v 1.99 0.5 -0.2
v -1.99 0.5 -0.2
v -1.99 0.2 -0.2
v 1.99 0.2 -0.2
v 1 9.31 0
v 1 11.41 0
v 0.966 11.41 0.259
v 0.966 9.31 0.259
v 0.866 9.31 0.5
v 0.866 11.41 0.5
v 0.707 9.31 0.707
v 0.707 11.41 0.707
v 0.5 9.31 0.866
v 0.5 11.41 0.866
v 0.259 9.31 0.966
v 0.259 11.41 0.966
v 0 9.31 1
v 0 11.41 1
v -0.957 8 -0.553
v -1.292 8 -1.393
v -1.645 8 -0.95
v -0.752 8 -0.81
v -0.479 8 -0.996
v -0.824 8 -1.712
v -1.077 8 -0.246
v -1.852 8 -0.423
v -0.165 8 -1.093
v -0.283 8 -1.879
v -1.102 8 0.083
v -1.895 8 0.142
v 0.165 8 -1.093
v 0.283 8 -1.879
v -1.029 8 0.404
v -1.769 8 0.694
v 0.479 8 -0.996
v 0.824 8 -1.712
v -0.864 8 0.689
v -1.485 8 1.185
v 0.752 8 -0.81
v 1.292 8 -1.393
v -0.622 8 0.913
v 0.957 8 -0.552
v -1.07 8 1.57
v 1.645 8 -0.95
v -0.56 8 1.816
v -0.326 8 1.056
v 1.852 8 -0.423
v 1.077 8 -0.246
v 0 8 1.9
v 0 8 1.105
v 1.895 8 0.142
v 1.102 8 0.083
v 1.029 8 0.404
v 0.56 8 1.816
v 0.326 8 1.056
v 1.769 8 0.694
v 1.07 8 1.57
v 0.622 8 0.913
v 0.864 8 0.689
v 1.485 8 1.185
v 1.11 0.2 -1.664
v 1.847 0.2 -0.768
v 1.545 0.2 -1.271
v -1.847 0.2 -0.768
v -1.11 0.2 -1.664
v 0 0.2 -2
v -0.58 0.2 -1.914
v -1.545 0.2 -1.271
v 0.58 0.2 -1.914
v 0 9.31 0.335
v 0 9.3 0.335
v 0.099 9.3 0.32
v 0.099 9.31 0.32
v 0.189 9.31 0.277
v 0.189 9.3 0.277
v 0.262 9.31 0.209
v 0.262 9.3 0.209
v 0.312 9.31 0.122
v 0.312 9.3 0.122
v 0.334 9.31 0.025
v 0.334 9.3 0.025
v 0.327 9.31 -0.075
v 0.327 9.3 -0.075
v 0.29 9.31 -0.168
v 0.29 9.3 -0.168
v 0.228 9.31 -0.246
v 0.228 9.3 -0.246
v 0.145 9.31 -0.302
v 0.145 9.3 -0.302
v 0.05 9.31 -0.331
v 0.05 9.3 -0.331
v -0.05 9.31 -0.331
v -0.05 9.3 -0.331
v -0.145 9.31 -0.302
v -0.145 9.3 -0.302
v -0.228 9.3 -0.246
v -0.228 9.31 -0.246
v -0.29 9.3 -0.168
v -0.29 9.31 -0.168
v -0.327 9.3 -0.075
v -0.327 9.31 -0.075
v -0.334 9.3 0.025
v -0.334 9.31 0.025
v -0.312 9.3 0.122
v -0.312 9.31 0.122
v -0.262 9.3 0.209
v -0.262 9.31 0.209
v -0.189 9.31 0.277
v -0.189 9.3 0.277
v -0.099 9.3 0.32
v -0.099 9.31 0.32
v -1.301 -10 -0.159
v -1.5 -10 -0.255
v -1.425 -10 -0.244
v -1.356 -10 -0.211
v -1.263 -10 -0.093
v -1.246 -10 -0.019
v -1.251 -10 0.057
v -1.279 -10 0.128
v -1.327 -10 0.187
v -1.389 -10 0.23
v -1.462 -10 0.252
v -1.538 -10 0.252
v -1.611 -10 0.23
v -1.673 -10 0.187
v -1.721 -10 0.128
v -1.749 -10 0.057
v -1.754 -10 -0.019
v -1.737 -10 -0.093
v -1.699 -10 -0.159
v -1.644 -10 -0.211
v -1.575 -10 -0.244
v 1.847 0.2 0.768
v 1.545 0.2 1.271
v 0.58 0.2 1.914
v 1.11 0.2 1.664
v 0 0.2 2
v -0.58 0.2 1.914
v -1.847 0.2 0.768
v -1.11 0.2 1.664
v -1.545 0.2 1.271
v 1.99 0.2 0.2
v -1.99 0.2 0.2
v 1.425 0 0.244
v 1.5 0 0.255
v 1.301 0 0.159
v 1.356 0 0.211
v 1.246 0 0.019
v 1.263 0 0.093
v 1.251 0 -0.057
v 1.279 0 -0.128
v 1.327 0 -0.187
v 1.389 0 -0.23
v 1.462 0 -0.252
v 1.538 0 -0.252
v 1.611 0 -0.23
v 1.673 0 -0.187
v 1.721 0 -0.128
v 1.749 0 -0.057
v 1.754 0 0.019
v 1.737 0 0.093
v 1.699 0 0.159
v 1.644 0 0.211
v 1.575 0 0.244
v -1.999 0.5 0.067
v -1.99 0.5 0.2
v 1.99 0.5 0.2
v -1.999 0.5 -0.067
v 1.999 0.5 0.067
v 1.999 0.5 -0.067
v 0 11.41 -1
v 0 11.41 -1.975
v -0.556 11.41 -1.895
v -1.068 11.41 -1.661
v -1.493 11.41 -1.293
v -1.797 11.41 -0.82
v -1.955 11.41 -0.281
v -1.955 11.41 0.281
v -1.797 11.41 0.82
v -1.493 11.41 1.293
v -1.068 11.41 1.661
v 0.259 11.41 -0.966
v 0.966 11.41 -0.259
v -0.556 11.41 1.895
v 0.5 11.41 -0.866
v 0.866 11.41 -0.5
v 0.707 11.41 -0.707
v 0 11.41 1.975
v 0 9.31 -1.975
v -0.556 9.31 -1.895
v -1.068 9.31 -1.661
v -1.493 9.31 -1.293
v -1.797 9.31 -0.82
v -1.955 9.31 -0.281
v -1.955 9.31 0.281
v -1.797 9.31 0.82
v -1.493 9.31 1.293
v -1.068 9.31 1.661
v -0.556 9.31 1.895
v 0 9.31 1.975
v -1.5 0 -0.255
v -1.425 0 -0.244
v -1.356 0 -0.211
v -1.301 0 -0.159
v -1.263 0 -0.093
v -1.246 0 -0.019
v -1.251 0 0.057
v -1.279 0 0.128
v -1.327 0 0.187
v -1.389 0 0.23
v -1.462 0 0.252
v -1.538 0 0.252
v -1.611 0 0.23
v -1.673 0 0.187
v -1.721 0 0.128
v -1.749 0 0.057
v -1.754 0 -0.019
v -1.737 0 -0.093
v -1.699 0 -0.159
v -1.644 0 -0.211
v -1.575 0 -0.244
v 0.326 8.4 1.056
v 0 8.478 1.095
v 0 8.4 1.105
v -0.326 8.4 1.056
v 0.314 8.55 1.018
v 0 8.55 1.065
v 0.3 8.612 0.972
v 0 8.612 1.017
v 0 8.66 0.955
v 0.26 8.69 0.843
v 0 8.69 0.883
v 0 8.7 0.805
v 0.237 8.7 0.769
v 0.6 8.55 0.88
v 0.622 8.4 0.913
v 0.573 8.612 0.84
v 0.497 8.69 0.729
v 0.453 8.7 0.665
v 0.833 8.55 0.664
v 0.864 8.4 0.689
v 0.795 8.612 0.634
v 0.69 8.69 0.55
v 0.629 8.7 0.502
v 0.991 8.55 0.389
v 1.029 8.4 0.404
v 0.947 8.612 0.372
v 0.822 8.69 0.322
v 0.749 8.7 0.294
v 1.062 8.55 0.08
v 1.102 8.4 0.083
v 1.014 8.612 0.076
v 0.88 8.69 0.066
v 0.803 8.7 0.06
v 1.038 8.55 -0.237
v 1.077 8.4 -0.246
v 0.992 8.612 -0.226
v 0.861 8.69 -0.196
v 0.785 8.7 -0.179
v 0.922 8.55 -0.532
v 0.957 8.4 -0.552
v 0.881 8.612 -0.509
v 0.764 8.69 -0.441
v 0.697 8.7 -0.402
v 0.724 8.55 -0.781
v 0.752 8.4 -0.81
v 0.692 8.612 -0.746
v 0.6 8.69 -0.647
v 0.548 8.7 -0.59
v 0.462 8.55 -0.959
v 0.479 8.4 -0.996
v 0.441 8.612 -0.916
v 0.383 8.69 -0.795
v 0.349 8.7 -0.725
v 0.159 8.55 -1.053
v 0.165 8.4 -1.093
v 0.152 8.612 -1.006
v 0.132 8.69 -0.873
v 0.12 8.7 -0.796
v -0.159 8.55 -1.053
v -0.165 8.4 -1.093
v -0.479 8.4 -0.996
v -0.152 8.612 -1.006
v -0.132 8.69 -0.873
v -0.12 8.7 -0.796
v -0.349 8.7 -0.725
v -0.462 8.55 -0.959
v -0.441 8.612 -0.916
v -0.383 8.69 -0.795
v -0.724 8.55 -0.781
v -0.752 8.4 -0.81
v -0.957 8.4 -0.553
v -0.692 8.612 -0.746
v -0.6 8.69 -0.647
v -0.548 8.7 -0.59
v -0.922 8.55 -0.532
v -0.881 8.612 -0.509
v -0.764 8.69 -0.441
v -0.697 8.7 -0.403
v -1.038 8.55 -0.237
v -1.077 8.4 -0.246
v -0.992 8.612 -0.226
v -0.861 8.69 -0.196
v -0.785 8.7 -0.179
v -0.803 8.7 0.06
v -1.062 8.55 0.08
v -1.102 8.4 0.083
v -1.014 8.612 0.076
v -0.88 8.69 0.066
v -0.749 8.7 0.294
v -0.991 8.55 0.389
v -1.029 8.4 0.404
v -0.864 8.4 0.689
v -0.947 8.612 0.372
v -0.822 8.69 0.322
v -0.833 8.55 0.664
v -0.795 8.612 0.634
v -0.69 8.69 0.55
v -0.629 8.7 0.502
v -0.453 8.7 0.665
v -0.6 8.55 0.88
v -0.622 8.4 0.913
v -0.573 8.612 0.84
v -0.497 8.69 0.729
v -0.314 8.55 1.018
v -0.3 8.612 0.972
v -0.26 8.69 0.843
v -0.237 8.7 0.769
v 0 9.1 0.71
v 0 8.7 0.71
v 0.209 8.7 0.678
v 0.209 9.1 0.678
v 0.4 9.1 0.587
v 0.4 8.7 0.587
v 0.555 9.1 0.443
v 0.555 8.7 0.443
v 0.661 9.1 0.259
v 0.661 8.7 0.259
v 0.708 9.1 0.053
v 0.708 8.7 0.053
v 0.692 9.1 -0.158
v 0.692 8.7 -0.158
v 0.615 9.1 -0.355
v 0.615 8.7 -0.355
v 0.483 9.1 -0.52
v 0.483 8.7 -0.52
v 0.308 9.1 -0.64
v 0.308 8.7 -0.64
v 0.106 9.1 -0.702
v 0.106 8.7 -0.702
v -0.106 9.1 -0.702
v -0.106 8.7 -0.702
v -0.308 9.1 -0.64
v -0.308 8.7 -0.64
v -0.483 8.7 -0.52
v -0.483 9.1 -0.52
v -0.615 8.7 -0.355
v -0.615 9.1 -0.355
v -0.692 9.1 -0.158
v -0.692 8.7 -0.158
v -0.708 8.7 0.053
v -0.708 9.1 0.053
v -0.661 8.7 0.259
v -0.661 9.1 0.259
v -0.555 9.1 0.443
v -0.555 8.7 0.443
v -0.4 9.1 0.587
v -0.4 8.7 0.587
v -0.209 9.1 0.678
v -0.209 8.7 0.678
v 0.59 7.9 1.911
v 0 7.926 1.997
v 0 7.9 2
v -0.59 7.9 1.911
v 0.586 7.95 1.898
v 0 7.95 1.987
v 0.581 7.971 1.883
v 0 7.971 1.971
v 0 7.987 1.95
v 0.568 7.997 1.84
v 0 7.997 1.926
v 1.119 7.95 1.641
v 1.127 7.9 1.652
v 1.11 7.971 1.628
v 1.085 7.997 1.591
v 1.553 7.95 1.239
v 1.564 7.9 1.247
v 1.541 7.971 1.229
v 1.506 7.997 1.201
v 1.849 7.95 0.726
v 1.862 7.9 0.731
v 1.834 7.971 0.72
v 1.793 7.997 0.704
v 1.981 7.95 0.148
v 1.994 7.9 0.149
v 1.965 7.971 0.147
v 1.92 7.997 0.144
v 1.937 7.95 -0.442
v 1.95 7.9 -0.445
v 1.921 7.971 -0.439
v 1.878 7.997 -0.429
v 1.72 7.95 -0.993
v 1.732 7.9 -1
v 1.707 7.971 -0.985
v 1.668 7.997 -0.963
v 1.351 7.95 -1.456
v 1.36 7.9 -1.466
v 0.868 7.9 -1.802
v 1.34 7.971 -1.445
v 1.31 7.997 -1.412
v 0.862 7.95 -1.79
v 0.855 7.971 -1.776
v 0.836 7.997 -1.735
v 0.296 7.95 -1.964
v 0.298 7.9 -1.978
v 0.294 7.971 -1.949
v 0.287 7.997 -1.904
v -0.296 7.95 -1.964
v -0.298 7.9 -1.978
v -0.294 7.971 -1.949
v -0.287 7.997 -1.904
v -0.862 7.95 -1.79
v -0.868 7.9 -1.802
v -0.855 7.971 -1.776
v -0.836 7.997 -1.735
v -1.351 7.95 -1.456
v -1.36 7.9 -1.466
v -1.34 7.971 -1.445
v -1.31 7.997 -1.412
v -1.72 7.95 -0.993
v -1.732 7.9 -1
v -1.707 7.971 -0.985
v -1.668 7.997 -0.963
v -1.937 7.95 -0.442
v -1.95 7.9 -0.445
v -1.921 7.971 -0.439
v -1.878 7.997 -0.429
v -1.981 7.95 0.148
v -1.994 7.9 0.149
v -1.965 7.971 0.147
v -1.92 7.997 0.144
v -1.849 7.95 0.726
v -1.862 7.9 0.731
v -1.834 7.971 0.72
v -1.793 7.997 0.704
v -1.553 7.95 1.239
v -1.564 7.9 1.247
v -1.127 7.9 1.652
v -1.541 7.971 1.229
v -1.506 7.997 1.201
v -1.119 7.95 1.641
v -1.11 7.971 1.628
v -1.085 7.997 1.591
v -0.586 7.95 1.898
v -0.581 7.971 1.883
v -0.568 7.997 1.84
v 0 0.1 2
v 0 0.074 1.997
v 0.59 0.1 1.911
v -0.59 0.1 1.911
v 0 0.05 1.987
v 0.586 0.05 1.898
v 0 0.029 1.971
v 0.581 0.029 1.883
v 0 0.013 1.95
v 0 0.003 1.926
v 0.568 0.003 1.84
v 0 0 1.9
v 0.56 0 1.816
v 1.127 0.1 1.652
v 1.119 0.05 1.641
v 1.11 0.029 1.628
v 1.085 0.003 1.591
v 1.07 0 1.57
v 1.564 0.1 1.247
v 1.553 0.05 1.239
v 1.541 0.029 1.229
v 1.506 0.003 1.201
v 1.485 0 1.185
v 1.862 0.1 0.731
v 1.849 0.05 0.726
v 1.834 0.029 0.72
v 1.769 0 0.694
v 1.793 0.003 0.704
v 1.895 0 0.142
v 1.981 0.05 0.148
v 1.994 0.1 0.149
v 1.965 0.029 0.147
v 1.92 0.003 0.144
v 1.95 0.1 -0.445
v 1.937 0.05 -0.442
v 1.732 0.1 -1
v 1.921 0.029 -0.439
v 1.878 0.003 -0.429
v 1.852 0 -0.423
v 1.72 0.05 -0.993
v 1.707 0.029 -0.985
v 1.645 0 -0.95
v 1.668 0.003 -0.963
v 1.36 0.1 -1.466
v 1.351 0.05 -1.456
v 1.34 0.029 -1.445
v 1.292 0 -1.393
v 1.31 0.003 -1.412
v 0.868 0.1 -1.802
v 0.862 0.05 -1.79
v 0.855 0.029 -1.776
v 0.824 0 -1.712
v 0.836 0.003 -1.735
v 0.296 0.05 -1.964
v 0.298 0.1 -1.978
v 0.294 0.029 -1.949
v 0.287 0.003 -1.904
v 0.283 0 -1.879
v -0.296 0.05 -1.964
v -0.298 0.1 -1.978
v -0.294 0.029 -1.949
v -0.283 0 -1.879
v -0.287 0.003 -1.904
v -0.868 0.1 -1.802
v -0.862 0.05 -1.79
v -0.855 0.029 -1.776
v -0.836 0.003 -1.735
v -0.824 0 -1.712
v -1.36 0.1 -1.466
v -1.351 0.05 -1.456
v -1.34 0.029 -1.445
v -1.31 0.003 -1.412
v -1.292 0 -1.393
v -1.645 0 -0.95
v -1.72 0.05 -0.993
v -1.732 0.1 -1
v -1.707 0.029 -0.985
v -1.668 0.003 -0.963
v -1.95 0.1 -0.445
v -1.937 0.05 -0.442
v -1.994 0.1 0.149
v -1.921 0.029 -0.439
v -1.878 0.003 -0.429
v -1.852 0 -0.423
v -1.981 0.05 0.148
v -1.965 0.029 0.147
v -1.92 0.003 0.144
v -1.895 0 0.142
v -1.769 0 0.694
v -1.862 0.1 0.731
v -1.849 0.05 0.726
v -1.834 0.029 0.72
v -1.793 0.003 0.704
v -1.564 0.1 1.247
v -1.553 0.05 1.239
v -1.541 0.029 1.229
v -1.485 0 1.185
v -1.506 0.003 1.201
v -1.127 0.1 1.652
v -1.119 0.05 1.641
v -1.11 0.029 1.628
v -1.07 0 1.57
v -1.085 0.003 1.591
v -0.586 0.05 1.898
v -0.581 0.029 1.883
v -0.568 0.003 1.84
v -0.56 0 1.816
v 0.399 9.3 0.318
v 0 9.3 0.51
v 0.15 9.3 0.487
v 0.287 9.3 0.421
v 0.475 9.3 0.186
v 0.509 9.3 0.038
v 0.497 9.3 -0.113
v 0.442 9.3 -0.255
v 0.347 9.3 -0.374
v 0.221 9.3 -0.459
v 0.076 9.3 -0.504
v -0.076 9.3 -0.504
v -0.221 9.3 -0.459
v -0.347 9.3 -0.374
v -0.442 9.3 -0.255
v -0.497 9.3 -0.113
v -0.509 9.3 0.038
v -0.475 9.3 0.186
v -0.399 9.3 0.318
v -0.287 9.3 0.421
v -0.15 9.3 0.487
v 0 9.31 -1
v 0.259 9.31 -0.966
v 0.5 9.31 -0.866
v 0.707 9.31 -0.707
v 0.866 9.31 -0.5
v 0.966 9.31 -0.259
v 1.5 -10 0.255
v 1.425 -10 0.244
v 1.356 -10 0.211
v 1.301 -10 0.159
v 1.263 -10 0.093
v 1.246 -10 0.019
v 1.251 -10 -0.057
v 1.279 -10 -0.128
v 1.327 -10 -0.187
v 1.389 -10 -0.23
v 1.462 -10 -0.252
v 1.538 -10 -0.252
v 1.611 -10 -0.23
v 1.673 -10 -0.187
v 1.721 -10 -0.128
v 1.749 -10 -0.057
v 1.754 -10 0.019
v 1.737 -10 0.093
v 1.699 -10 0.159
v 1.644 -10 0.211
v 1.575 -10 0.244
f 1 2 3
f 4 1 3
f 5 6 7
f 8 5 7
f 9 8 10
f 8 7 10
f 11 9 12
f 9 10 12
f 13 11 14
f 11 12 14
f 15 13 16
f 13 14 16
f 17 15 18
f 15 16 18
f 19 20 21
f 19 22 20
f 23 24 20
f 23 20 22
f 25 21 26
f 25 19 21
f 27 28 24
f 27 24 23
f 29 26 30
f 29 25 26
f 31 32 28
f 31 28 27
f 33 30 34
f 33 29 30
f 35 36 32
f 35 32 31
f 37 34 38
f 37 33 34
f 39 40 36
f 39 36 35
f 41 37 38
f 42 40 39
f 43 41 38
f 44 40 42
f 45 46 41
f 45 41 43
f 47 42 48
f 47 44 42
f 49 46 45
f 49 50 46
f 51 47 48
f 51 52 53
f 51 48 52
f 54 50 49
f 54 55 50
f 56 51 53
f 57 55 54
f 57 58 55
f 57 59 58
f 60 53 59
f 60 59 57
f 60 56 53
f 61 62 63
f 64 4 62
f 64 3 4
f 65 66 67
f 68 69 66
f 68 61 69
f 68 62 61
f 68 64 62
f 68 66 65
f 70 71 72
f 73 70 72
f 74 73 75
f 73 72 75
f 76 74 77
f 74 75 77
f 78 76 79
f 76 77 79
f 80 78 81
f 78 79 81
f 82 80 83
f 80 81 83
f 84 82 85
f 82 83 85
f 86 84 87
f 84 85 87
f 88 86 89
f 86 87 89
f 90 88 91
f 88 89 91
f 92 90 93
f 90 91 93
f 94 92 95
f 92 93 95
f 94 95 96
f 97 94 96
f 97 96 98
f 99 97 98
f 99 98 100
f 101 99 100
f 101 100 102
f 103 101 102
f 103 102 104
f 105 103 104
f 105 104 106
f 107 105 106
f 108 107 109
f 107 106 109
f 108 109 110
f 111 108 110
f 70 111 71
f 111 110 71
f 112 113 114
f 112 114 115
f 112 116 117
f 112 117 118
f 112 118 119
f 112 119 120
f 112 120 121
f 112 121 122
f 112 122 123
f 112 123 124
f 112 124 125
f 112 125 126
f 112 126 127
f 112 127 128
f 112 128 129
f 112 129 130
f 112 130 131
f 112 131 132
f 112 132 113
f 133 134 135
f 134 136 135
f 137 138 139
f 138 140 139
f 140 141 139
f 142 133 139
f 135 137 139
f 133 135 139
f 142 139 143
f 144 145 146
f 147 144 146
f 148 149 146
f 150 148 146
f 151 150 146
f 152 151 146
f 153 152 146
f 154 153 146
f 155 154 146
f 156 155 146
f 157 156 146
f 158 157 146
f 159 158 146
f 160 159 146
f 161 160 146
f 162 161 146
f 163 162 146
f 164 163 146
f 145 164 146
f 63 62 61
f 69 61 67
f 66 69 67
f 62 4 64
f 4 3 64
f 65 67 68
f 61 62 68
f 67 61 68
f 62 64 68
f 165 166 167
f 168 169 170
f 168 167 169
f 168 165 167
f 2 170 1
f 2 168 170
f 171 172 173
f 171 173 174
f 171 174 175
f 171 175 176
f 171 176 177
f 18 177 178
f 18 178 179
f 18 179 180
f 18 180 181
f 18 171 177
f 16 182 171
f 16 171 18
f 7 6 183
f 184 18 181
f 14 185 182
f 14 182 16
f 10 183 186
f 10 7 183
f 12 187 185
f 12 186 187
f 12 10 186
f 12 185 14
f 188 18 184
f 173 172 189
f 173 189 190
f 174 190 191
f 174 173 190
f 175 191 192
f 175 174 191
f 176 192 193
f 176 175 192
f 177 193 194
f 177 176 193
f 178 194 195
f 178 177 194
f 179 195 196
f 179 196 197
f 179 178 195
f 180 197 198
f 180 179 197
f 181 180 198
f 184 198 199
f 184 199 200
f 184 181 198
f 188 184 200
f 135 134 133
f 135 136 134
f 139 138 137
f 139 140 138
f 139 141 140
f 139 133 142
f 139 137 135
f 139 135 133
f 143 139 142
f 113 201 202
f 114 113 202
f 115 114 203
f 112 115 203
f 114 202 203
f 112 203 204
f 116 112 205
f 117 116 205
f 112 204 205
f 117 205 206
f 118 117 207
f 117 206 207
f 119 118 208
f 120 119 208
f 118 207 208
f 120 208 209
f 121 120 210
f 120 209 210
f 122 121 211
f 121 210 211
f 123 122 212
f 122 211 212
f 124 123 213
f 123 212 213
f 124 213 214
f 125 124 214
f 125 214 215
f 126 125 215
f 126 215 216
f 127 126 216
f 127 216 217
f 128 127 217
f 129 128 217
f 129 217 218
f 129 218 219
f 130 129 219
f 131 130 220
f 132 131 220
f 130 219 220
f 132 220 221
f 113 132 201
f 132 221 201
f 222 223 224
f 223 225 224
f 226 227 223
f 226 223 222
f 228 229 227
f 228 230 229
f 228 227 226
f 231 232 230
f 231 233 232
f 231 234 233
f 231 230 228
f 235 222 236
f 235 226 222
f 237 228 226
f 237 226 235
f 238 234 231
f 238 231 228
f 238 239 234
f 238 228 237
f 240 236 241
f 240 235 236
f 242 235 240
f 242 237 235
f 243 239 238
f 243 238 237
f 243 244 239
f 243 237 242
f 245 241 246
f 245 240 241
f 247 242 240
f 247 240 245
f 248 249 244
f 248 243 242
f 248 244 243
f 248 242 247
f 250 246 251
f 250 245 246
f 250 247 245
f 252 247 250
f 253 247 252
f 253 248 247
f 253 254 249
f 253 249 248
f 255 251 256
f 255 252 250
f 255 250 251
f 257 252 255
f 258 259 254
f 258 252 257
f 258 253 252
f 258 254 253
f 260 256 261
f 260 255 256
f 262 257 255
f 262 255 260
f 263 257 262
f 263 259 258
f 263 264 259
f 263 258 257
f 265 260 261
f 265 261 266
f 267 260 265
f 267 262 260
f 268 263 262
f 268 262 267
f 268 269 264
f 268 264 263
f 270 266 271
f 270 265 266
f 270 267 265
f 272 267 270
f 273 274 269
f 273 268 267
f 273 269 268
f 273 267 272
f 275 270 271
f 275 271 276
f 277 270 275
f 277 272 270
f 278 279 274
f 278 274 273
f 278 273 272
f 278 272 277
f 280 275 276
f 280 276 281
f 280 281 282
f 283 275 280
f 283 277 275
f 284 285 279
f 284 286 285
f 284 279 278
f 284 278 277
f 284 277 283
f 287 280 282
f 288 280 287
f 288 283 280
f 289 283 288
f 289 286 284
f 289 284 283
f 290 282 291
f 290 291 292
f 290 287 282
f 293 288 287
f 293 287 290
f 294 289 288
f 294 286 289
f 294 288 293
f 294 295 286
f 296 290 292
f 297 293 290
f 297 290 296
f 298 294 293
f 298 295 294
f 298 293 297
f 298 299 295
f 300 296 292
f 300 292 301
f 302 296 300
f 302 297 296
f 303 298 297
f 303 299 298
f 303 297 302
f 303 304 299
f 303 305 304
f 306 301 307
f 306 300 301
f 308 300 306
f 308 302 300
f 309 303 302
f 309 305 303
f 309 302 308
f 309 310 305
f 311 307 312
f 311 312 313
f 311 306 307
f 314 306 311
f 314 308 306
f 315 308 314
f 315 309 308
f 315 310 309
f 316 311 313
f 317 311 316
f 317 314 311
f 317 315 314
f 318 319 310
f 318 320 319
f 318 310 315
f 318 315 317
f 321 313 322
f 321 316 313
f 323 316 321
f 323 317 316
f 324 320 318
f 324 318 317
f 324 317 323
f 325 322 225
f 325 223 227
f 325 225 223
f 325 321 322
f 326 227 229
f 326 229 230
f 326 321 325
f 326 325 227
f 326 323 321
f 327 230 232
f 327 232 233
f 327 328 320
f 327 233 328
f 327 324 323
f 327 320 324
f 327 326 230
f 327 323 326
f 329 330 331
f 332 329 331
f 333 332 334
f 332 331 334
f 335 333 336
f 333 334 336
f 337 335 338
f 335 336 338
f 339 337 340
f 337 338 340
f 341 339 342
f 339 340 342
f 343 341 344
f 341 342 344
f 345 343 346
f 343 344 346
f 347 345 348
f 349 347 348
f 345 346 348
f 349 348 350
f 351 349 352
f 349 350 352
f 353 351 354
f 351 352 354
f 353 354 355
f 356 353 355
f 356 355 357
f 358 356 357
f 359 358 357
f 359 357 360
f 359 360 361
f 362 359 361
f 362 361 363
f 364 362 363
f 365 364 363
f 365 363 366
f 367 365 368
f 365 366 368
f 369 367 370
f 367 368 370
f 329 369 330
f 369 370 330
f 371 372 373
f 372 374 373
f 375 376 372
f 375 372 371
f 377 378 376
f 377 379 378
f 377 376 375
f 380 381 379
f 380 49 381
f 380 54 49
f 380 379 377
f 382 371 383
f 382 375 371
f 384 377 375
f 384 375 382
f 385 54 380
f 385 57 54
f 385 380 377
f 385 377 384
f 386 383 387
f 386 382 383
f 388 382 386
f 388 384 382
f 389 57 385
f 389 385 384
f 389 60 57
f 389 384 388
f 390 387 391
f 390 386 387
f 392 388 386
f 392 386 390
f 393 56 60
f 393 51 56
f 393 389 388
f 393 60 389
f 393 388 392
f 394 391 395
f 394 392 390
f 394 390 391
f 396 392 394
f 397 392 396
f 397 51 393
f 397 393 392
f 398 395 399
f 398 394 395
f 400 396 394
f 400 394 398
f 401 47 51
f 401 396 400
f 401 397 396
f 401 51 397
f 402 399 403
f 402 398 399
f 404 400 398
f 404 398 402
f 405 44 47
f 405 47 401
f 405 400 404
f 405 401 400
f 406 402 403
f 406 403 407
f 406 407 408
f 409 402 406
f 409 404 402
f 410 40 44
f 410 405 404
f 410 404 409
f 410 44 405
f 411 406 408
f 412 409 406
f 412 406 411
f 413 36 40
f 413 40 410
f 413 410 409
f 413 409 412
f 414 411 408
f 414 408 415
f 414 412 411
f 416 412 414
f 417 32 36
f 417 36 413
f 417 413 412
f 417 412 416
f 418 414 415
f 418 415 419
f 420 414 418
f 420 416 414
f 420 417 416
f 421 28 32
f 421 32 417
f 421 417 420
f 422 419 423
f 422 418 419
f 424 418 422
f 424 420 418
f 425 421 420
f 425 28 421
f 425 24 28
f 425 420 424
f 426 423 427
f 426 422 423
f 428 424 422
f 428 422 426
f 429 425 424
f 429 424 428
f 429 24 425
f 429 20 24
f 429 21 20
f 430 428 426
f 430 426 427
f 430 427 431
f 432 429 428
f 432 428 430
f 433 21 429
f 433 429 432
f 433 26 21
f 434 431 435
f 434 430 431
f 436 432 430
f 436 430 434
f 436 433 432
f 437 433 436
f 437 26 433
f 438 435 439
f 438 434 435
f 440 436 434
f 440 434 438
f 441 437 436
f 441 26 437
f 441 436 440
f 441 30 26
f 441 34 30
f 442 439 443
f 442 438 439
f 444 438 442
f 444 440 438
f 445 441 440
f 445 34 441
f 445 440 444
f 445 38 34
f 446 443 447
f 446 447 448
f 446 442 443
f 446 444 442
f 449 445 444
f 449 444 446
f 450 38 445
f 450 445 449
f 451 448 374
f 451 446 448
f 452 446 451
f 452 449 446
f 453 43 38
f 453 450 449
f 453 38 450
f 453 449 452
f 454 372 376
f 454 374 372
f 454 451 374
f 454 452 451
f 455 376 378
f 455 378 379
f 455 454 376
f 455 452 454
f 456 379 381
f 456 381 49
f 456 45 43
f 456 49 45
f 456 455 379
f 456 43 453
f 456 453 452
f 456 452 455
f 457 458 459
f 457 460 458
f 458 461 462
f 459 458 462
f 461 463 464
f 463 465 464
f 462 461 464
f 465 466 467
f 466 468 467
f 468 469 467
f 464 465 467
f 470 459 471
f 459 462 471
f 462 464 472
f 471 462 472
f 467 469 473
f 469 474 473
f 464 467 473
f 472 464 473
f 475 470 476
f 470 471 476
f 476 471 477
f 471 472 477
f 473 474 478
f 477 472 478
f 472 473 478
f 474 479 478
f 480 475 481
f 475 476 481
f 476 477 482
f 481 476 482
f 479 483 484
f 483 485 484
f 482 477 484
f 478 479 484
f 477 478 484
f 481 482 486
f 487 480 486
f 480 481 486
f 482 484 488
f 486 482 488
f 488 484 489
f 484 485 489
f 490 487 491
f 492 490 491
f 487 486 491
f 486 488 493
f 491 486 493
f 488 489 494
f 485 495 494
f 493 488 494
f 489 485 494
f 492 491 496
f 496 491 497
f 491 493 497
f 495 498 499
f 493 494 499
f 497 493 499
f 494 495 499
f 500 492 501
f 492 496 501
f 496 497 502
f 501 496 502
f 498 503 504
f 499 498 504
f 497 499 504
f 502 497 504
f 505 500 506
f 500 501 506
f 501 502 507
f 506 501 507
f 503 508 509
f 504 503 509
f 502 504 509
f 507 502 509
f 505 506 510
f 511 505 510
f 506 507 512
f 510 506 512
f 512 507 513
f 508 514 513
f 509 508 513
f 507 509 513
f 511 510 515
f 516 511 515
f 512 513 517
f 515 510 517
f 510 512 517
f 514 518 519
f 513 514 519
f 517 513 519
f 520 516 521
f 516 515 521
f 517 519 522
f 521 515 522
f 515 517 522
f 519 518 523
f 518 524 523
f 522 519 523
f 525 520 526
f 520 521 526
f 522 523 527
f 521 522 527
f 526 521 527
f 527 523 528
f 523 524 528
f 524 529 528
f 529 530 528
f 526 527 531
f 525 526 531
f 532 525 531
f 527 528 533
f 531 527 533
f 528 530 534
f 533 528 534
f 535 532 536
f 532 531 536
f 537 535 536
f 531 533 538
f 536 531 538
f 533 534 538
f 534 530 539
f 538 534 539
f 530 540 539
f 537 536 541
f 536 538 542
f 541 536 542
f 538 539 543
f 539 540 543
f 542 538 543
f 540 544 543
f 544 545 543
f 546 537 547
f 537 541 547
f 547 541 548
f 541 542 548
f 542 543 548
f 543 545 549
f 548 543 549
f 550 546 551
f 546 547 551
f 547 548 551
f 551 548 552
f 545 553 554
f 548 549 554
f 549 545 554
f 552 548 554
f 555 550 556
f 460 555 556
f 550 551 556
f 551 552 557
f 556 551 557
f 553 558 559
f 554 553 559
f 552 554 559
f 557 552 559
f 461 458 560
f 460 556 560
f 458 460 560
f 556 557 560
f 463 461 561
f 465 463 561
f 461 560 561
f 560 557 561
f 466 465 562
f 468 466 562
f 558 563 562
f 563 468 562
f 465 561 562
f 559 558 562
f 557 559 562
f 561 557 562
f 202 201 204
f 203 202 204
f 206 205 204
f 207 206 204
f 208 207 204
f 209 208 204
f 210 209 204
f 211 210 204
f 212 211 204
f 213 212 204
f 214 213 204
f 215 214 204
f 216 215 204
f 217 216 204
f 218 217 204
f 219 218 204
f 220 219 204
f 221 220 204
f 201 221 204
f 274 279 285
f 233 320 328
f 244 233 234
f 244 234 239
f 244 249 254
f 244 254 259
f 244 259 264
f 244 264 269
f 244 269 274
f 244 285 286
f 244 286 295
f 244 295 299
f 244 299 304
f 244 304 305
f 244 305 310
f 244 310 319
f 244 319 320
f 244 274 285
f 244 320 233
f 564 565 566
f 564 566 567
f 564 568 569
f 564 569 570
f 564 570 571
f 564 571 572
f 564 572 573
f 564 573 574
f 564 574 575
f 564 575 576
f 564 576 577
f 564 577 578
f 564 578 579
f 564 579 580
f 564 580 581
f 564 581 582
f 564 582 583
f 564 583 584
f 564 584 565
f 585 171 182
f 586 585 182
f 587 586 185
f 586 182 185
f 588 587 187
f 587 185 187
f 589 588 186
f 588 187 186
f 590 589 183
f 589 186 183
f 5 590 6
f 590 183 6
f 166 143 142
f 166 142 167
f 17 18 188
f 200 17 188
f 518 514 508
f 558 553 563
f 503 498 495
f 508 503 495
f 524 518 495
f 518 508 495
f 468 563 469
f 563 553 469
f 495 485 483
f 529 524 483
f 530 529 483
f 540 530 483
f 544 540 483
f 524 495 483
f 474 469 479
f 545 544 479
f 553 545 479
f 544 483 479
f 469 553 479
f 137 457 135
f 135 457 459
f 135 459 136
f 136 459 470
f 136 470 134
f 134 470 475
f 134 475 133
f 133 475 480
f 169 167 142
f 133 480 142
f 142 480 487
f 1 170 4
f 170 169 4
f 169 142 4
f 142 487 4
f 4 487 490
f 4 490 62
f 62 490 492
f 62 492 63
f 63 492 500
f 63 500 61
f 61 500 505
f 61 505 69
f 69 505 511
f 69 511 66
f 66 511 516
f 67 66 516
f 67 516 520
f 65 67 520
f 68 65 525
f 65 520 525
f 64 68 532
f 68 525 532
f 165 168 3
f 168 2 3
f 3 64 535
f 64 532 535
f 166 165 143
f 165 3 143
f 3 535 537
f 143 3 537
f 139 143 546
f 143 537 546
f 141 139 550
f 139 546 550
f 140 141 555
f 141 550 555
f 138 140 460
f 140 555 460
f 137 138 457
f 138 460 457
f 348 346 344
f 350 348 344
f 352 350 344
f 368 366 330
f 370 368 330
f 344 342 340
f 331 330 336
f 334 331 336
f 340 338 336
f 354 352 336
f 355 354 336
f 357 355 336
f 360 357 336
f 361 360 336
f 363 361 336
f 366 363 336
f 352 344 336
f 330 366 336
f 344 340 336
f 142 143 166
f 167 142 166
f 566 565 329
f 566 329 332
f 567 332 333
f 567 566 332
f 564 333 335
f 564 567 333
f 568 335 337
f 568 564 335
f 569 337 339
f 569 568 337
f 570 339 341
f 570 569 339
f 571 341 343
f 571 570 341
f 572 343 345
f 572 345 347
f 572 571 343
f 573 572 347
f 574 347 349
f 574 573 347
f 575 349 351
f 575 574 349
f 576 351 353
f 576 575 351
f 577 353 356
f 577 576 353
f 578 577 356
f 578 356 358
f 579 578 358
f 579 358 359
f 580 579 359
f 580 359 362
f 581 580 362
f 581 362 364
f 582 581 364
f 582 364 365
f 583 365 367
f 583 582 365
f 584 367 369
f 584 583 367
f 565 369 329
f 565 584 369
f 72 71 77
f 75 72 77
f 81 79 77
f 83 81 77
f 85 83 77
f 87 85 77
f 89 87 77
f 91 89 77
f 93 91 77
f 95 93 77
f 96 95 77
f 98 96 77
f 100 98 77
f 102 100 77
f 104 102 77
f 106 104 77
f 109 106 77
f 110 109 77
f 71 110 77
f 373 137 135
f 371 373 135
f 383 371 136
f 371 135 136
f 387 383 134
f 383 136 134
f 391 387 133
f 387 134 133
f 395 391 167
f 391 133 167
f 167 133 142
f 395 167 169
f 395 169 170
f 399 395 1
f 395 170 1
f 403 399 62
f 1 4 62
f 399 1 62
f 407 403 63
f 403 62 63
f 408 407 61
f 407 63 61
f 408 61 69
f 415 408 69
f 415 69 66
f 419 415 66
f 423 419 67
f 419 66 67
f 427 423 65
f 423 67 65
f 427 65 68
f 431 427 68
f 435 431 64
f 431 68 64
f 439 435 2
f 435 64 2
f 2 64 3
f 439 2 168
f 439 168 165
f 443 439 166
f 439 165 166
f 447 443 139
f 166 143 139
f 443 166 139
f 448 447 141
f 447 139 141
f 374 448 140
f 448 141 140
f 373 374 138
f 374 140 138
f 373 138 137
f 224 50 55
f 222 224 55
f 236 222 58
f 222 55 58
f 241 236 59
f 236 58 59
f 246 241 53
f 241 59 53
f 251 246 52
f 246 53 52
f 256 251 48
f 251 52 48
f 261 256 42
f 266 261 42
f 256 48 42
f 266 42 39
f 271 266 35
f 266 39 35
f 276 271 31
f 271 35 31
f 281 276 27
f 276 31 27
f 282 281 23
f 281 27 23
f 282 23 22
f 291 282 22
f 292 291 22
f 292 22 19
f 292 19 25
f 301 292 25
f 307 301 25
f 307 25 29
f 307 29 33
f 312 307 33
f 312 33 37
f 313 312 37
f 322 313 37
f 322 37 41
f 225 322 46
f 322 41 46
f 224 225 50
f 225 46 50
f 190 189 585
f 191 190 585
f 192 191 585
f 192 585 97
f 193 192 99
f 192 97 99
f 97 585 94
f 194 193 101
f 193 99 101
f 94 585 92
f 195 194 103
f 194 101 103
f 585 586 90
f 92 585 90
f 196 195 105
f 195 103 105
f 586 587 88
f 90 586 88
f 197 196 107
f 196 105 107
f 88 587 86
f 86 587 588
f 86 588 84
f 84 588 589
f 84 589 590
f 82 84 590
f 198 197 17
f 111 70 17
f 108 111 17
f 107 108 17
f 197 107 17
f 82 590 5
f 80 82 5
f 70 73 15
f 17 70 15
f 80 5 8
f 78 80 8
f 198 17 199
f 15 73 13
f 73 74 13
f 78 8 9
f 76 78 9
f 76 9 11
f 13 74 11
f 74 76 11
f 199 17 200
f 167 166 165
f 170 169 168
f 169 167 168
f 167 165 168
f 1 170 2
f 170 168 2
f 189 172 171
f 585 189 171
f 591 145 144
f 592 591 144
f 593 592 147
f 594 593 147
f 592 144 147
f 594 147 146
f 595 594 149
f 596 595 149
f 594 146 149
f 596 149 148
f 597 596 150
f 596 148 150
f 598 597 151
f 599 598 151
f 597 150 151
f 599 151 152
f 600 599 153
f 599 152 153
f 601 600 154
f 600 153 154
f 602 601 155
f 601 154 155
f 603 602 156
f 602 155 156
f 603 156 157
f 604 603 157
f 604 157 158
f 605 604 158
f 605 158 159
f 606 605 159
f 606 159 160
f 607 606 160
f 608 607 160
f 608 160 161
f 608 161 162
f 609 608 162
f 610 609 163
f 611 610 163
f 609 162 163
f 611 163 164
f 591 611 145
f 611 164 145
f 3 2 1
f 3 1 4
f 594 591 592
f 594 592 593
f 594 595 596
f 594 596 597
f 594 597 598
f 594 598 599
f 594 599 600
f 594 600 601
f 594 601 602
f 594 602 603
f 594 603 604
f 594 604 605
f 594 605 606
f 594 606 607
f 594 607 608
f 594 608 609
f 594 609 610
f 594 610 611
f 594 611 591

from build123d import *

# Parameters (mm, degrees)
SKETCH1_R              = 2
BOSS_EXTRUDE1_DEPTH    = 8
SKETCH2_R              = 1.105
BOSS_EXTRUDE2_DEPTH    = 0.7
SKETCH3_R              = 0.71
BOSS_EXTRUDE3_DEPTH    = 0.6
SKETCH4_R              = 0.335
BOSS_EXTRUDE4_DEPTH    = 2.11
SPLIT1_SURFACE_1_BACK  = 13.735
SPLIT1_SURFACE_1_DEPTH = 27.47
SPLIT1_SURFACE_2_BACK  = 13.735
SPLIT1_SURFACE_2_DEPTH = 27.47
FILLET1_R              = 0.1
FILLET2_R              = 0.1
FILLET3_R              = 0.3
CHAMFER1_SIZE          = 0.2
FILLET4_R              = 0.1
SKETCH6_R              = 0.255
BOSS_EXTRUDE5_DEPTH    = 10
BOSS_EXTRUDE5_2_DEPTH  = 10
SKETCH7_R              = 1.975
BOSS_EXTRUDE6_DEPTH    = 2.1
CUT_EXTRUDE1_DEPTH     = 2.1


with BuildPart() as part:
    # Sketch1 → Boss-Extrude1 (new body)
    with BuildSketch(Plane(origin=(0, 0, 0), x_dir=(1, 0, 0), z_dir=(0, 1, 0))):
        with Locations(Location((0, 0, 0), (0, 0, 270))):
            Circle(SKETCH1_R)
    extrude(amount=BOSS_EXTRUDE1_DEPTH)

    # Sketch2 → Boss-Extrude2 (add)
    with BuildSketch(Plane(origin=(0, 8, 0), x_dir=(1, 0, 0), z_dir=(0, 1, 0))):
        with Locations(Location((0, 0, 0), (0, 0, 270))):
            Circle(SKETCH2_R)
    extrude(amount=BOSS_EXTRUDE2_DEPTH)


with BuildPart() as body_2:
    # Sketch3 → Boss-Extrude3 (new body)
    with BuildSketch(Plane(origin=(0, 8.7, 0), x_dir=(1, 0, 0), z_dir=(0, 1, 0))):
        with Locations(Location((0, 0, 0), (0, 0, 270))):
            Circle(SKETCH3_R)
    extrude(amount=BOSS_EXTRUDE3_DEPTH)

    # Chamfer1
    chamfer1_edges = [body_2.edges().sort_by_distance(p)[0] for p in [
        (0, 9.3, -0.71),
    ]]
    chamfer(chamfer1_edges, length=CHAMFER1_SIZE)


with BuildPart() as body_3:
    # Sketch4 → Boss-Extrude4 (new body)
    with BuildSketch(Plane(origin=(0, 9.3, 0), x_dir=(1, 0, 0), z_dir=(0, 1, 0))):
        with Locations(Location((0, 0, 0), (0, 0, 270))):
            Circle(SKETCH4_R)
    extrude(amount=BOSS_EXTRUDE4_DEPTH)

    # Fillet4
    fillet4_edges = [body_3.edges().sort_by_distance(p)[0] for p in [
        (0, 11.41, -0.335),
    ]]
    fillet(fillet4_edges, radius=FILLET4_R)

    # Sketch7 → Boss-Extrude6 (add)
    with BuildSketch(Plane(origin=(0, 11.41, 0), x_dir=(1, 0, 0), z_dir=(0, 1, 0))):
        with Locations(Location((0, 0, 0), (0, 0, 270))):
            Circle(SKETCH7_R)
    extrude(amount=-BOSS_EXTRUDE6_DEPTH)

    # Sketch8 → Cut-Extrude1 (cut)
    with BuildSketch(Plane(origin=(0, 11.41, 0), x_dir=(1, 0, 0), z_dir=(0, 1, 0))):
        with BuildLine():
            ThreePointArc((1.975, 0), (1.396535893, 1.396535893), (0, 1.975))
            Line((0, 1.975), (0, 1))
            ThreePointArc((0, 1), (0.707106781, 0.707106781), (1, 0))
            ThreePointArc((1, 0), (0.707106781, -0.707106781), (0, -1))
            Line((0, -1), (0, -1.975))
            ThreePointArc((0, -1.975), (1.396535893, -1.396535893), (1.975, 0))
        make_face()
    extrude(amount=-CUT_EXTRUDE1_DEPTH, mode=Mode.SUBTRACT)


with BuildPart() as body_4:
    # Split1: the piece behind the surface
    add(part.part)
    # Split1 surface: a surface, the sketch's curves swept straight by 27.47 mm
    with BuildLine(Plane(origin=(0, 0, 0), x_dir=(0, 0, -1), z_dir=(1, 0, 0)).offset(-SPLIT1_SURFACE_1_BACK), mode=Mode.PRIVATE) as split1_surface_1_path:
        Line((-2, 0.2), (-0.2, 0.2))
        Line((-0.2, 0.2), (-0.2, 0.5))
        Line((-0.2, 0.5), (0.2, 0.5))
        Line((0.2, 0.5), (0.2, 0.2))
        Line((0.2, 0.2), (2, 0.2))
    split1_surface_1 = Shell.extrude(split1_surface_1_path.wire(), (1 * SPLIT1_SURFACE_1_DEPTH, 0 * SPLIT1_SURFACE_1_DEPTH, 0 * SPLIT1_SURFACE_1_DEPTH))
    split(bisect_by=split1_surface_1, keep=Keep.BOTTOM)

    # Fillet1
    fillet1_edges = [body_4.edges().sort_by_distance(p)[0] for p in [
        (0, 0, -2),
    ]]
    fillet(fillet1_edges, radius=FILLET1_R)


with BuildPart() as part_1:
    add(part.part)

    # Split1: split by a surface, the side it looks to stays
    # Split1 surface: a surface, the sketch's curves swept straight by 27.47 mm
    with BuildLine(Plane(origin=(0, 0, 0), x_dir=(0, 0, -1), z_dir=(1, 0, 0)).offset(-SPLIT1_SURFACE_2_BACK), mode=Mode.PRIVATE) as split1_surface_2_path:
        Line((-2, 0.2), (-0.2, 0.2))
        Line((-0.2, 0.2), (-0.2, 0.5))
        Line((-0.2, 0.5), (0.2, 0.5))
        Line((0.2, 0.5), (0.2, 0.2))
        Line((0.2, 0.2), (2, 0.2))
    split1_surface_2 = Shell.extrude(split1_surface_2_path.wire(), (1 * SPLIT1_SURFACE_2_DEPTH, 0 * SPLIT1_SURFACE_2_DEPTH, 0 * SPLIT1_SURFACE_2_DEPTH))
    split(bisect_by=split1_surface_2, keep=Keep.TOP)

    # Fillet2
    fillet2_edges = [part_1.edges().sort_by_distance(p)[0] for p in [
        (0, 8, -2),
    ]]
    fillet(fillet2_edges, radius=FILLET2_R)

    # Fillet3
    fillet3_edges = [part_1.edges().sort_by_distance(p)[0] for p in [
        (0, 8.7, -1.105),
    ]]
    fillet(fillet3_edges, radius=FILLET3_R)


with BuildPart() as body_5:
    # Sketch6 → Boss-Extrude5 (new body)
    with BuildSketch(Plane.XZ):
        with Locations(Location((-1.5, 0, 0), (0, 0, 270))):
            Circle(SKETCH6_R)
    extrude(amount=BOSS_EXTRUDE5_DEPTH)


with BuildPart() as body_6:
    # Sketch6 → Boss-Extrude5 2 (new body)
    with BuildSketch(Plane.XZ):
        with Locations(Location((1.5, 0, 0), (0, 0, 90))):
            Circle(SKETCH6_R)
    extrude(amount=BOSS_EXTRUDE5_2_DEPTH)


solid = Compound([body_2.part, body_3.part, body_4.part, part_1.part, body_5.part, body_6.part])
